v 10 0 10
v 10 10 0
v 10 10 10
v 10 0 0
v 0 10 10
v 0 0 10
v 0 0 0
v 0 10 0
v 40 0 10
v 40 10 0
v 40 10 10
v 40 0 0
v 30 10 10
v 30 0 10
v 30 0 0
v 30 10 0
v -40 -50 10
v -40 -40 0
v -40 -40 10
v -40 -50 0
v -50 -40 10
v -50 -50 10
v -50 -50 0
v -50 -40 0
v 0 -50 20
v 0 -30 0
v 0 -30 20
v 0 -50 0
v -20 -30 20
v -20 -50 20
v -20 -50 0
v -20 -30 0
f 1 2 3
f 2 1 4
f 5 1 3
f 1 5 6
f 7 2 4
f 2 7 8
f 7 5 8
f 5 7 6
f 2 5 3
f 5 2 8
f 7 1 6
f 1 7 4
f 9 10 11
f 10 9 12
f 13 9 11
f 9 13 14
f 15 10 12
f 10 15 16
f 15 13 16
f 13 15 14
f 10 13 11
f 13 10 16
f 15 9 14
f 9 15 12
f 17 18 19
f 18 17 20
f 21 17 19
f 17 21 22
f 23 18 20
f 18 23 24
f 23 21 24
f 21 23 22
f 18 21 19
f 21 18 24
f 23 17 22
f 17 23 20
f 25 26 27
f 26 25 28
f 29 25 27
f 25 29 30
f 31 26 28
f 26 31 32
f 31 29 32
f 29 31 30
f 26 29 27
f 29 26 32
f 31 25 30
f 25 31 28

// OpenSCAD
regular  = 10;
$special = 10;

module r() {
  cube(regular);  // cannot be overridden
}

module s() {
  cube($special); // can be overridden from a parent scope calling this module
}

color("red") {
  r();
  union() {
    regular = regular + 10;
    translate([30,0,0]) r();
  }
}

color("blue") translate([-50, -50, 0]) {
  s();
  union() {
    $special = $special + 10;
    translate([30,0,0]) s();
  }
}


// TLDR: with $special variables you can override them and have a cascade
// effect with values that should be passed down to the children.
